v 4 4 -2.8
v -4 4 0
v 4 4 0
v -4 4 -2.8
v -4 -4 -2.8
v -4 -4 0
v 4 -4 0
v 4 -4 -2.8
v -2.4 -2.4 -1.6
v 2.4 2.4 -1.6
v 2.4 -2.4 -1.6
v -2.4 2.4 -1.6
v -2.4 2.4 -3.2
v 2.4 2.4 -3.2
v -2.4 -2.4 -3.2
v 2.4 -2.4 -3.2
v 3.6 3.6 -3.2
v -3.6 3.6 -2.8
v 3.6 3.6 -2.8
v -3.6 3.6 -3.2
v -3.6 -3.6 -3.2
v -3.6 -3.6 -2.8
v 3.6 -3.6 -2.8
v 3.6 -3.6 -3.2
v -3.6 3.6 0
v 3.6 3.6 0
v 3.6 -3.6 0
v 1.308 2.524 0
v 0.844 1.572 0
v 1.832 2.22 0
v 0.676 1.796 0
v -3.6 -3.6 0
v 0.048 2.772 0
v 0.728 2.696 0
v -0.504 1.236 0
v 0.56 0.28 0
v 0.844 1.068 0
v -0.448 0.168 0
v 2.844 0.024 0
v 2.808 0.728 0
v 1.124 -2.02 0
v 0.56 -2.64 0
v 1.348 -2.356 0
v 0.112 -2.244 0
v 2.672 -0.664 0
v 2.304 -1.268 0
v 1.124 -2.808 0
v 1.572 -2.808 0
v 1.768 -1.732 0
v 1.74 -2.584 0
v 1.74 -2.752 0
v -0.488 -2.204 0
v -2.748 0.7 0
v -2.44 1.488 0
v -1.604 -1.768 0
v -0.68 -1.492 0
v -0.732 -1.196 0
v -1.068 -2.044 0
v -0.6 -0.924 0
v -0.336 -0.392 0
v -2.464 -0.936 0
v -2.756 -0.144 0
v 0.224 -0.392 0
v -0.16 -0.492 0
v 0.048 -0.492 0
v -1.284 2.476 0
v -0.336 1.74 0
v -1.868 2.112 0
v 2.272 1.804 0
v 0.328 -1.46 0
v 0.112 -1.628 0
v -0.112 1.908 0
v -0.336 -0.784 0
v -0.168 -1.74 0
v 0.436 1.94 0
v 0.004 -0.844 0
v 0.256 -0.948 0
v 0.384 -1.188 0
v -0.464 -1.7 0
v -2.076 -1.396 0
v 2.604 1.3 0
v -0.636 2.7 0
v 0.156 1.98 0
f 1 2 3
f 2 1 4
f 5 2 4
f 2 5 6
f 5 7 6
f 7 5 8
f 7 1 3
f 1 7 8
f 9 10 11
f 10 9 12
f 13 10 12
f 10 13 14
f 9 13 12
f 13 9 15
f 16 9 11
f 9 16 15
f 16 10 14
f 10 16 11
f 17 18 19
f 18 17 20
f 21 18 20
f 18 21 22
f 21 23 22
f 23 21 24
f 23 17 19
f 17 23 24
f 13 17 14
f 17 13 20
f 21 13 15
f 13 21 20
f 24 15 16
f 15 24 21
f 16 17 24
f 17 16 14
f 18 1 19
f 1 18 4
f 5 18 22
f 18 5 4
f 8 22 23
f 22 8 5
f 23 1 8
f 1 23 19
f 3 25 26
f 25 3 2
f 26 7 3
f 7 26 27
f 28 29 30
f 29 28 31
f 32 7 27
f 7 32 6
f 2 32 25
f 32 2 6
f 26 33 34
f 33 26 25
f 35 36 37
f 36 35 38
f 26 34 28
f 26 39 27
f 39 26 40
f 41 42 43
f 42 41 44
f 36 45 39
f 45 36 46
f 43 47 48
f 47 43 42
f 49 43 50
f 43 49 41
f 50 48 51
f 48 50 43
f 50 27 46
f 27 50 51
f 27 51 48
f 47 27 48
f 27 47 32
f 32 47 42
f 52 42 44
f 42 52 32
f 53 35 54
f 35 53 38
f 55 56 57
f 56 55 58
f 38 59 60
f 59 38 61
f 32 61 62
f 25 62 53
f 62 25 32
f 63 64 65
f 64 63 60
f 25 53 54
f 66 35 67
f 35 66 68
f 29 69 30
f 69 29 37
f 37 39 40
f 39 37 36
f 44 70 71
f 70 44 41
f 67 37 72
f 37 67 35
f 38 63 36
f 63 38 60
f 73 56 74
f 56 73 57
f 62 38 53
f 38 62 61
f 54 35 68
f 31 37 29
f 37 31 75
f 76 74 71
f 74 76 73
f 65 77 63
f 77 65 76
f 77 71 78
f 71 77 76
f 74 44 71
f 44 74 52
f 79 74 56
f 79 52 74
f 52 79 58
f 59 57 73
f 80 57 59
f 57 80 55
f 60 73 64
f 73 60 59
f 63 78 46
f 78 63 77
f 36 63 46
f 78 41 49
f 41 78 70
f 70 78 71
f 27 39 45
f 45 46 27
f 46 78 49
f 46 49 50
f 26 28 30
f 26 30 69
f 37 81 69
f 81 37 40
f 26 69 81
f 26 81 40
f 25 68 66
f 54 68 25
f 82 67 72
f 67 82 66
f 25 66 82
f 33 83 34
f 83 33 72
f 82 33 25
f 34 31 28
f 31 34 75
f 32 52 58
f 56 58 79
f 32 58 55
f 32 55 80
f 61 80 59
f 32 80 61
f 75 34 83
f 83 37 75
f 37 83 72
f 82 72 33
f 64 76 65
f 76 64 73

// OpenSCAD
// file: ../p/box5.scad
use <../lib.scad>
function ldraw_lib__box5() = [
// 0 Box with 5 Faces and All Edges
// 0 Name: box5.dat
// 0 Author: James Jessiman
// 0 !LDRAW_ORG Primitive UPDATE 2012-01
// 0 !LICENSE Licensed under CC BY 2.0 and CC BY 4.0 : see CAreadme.txt
// 
// 0 BFC CERTIFY CCW
  [0,"BFC","CERTIFY"],
  [0,"BFC","CCW"],
// 
// 0 !HISTORY 2002-04-03 [sbliss] Modified for BFC compliance
// 0 !HISTORY 2002-04-25 [PTadmin] Official Update 2002-02
// 0 !HISTORY 2007-06-24 [PTadmin] Header formatted for Contributor Agreement
// 0 !HISTORY 2008-07-01 [PTadmin] Official Update 2008-01
// 0 !HISTORY 2012-02-16 [Philo] Changed to CCW
// 0 !HISTORY 2012-03-30 [PTadmin] Official Update 2012-01
// 
// 
// 2 24 1 1 1 -1 1 1
  [2,24,1,1,1,-1,1,1],
// 2 24 -1 1 1 -1 1 -1
  [2,24,-1,1,1,-1,1,-1],
// 2 24 -1 1 -1 1 1 -1
  [2,24,-1,1,-1,1,1,-1],
// 2 24 1 1 -1 1 1 1
  [2,24,1,1,-1,1,1,1],
// 2 24 1 0 1 -1 0 1
  [2,24,1,0,1,-1,0,1],
// 2 24 -1 0 1 -1 0 -1
  [2,24,-1,0,1,-1,0,-1],
// 2 24 -1 0 -1 1 0 -1
  [2,24,-1,0,-1,1,0,-1],
// 2 24 1 0 -1 1 0 1
  [2,24,1,0,-1,1,0,1],
// 2 24 1 0 1 1 1 1
  [2,24,1,0,1,1,1,1],
// 2 24 -1 0 1 -1 1 1
  [2,24,-1,0,1,-1,1,1],
// 2 24 1 0 -1 1 1 -1
  [2,24,1,0,-1,1,1,-1],
// 2 24 -1 0 -1 -1 1 -1
  [2,24,-1,0,-1,-1,1,-1],
// 4 16 -1 1 1 1 1 1 1 1 -1 -1 1 -1
  [4,16,-1,1,1,1,1,1,1,1,-1,-1,1,-1],
// 4 16 -1 1 1 -1 0 1 1 0 1 1 1 1
  [4,16,-1,1,1,-1,0,1,1,0,1,1,1,1],
// 4 16 -1 1 -1 -1 0 -1 -1 0 1 -1 1 1
  [4,16,-1,1,-1,-1,0,-1,-1,0,1,-1,1,1],
// 4 16 1 1 -1 1 0 -1 -1 0 -1 -1 1 -1
  [4,16,1,1,-1,1,0,-1,-1,0,-1,-1,1,-1],
// 4 16 1 1 1 1 0 1 1 0 -1 1 1 -1
  [4,16,1,1,1,1,0,1,1,0,-1,1,1,-1],
];
makepoly(ldraw_lib__box5(), line=0.2);
// file: ../p/box4.scad
use <../lib.scad>
function ldraw_lib__box4() = [
// 0 Box with 4 Faces (2 Parallel Pairs) and All Edges
// 0 Name: box4.dat
// 0 Author: James Jessiman
// 0 !LDRAW_ORG Primitive UPDATE 2012-01
// 0 !LICENSE Licensed under CC BY 2.0 and CC BY 4.0 : see CAreadme.txt
// 
// 0 BFC CERTIFY CCW
  [0,"BFC","CERTIFY"],
  [0,"BFC","CCW"],
// 
// 0 !HISTORY 2002-04-03 [sbliss] Modified for BFC compliance
// 0 !HISTORY 2002-04-25 [PTadmin] Official Update 2002-02
// 0 !HISTORY 2007-06-24 [PTadmin] Header formatted for Contributor Agreement
// 0 !HISTORY 2008-07-01 [PTadmin] Official Update 2008-01
// 0 !HISTORY 2012-02-16 [Philo] Changed to CCW
// 0 !HISTORY 2012-03-30 [PTadmin] Official Update 2012-01
// 
// 
// 2 24 1 1 1 -1 1 1
  [2,24,1,1,1,-1,1,1],
// 2 24 -1 1 1 -1 1 -1
  [2,24,-1,1,1,-1,1,-1],
// 2 24 -1 1 -1 1 1 -1
  [2,24,-1,1,-1,1,1,-1],
// 2 24 1 1 -1 1 1 1
  [2,24,1,1,-1,1,1,1],
// 2 24 1 0 1 -1 0 1
  [2,24,1,0,1,-1,0,1],
// 2 24 -1 0 1 -1 0 -1
  [2,24,-1,0,1,-1,0,-1],
// 2 24 -1 0 -1 1 0 -1
  [2,24,-1,0,-1,1,0,-1],
// 2 24 1 0 -1 1 0 1
  [2,24,1,0,-1,1,0,1],
// 2 24 1 0 1 1 1 1
  [2,24,1,0,1,1,1,1],
// 2 24 -1 0 1 -1 1 1
  [2,24,-1,0,1,-1,1,1],
// 2 24 1 0 -1 1 1 -1
  [2,24,1,0,-1,1,1,-1],
// 2 24 -1 0 -1 -1 1 -1
  [2,24,-1,0,-1,-1,1,-1],
// 4 16 -1 1 1 -1 0 1 1 0 1 1 1 1
  [4,16,-1,1,1,-1,0,1,1,0,1,1,1,1],
// 4 16 -1 1 -1 -1 0 -1 -1 0 1 -1 1 1
  [4,16,-1,1,-1,-1,0,-1,-1,0,1,-1,1,1],
// 4 16 1 1 -1 1 0 -1 -1 0 -1 -1 1 -1
  [4,16,1,1,-1,1,0,-1,-1,0,-1,-1,1,-1],
// 4 16 1 1 1 1 0 1 1 0 -1 1 1 -1
  [4,16,1,1,1,1,0,1,1,0,-1,1,1,-1],
];
makepoly(ldraw_lib__box4(), line=0.2);
// file: s/3070bs01.scad
use <../../lib.scad>
use <../../p/box4.scad>
use <../../p/box5.scad>
function ldraw_lib__s__3070bs01() = [
// 0 ~Tile  1 x  1 with Groove without Top Face
// 0 Name: s\3070bs01.dat
// 0 Author: Chris Dee [cwdee]
// 0 !LDRAW_ORG Subpart UPDATE 2009-02
// 0 !LICENSE Licensed under CC BY 2.0 and CC BY 4.0 : see CAreadme.txt
// 
// 0 BFC CERTIFY CCW
  [0,"BFC","CERTIFY"],
  [0,"BFC","CCW"],
// 
// 0 !HISTORY 2009-09-03 [PTadmin] Official Update 2009-02
// 
// 
// 1 16 0 0 0 10 0 0 0 7 0 0 0 10 box4.dat
  [1,16,0,0,0,10,0,0,0,7,0,0,0,10, ldraw_lib__box4()],
// 0 BFC INVERTNEXT
  [0,"BFC","INVERTNEXT"],
// 1 16 0 8 0 6 0 0 0 -4 0 0 0 6 box5.dat
  [1,16,0,8,0,6,0,0,0,-4,0,0,0,6, ldraw_lib__box5()],
// 1 16 0 7 0 9 0 0 0 1 0 0 0 9 box4.dat
  [1,16,0,7,0,9,0,0,0,1,0,0,0,9, ldraw_lib__box4()],
// 
// 4 16 9 8 9 6 8 6 -6 8 6 -9 8 9
  [4,16,9,8,9,6,8,6,-6,8,6,-9,8,9],
// 4 16 -9 8 9 -6 8 6 -6 8 -6 -9 8 -9
  [4,16,-9,8,9,-6,8,6,-6,8,-6,-9,8,-9],
// 4 16 -9 8 -9 -6 8 -6 6 8 -6 9 8 -9
  [4,16,-9,8,-9,-6,8,-6,6,8,-6,9,8,-9],
// 4 16 9 8 -9 6 8 -6 6 8 6 9 8 9
  [4,16,9,8,-9,6,8,-6,6,8,6,9,8,9],
// 
// 4 16 10 7 10 9 7 9 -9 7 9 -10 7 10
  [4,16,10,7,10,9,7,9,-9,7,9,-10,7,10],
// 4 16 -10 7 10 -9 7 9 -9 7 -9 -10 7 -10
  [4,16,-10,7,10,-9,7,9,-9,7,-9,-10,7,-10],
// 4 16 -10 7 -10 -9 7 -9 9 7 -9 10 7 -10
  [4,16,-10,7,-10,-9,7,-9,9,7,-9,10,7,-10],
// 4 16 10 7 -10 9 7 -9 9 7 9 10 7 10
  [4,16,10,7,-10,9,7,-9,9,7,9,10,7,10],
// 0
];
makepoly(ldraw_lib__s__3070bs01(), line=0.2);
// main file
use <../lib.scad>
use <s/3070bs01.scad>
function ldraw_lib__3070bp0x() = [
// 0 Tile  1 x  1 with Coral Exclamation Mark in Speech Bubble on Dark Turquoise Background Pattern
// 0 Name: 3070bp0x.dat
// 0 Author: Philippe Hurbain [Philo]
// 0 !LDRAW_ORG Part UPDATE 2020-03
// 0 !LICENSE Licensed under CC BY 2.0 and CC BY 4.0 : see CAreadme.txt
// 
// 0 BFC CERTIFY CCW
  [0,"BFC","CERTIFY"],
  [0,"BFC","CCW"],
// 
// 0 !KEYWORDS Bricklink 3070bpb155, Dots, Set 41916
// 
// 0 !HISTORY 2020-12-29 [PTadmin] Official Update 2020-03
// 
// 
// 1 16 0 0 0 1 0 0 0 1 0 0 0 1 s\3070bs01.dat
  [1,16,0,0,0,1,0,0,0,1,0,0,0,1, ldraw_lib__s__3070bs01()],
// 4 16 10 0 10 -10 0 10 -9 0 9 9 0 9
  [4,16,10,0,10,-10,0,10,-9,0,9,9,0,9],
// 4 16 10 0 -10 10 0 10 9 0 9 9 0 -9
  [4,16,10,0,-10,10,0,10,9,0,9,9,0,-9],
// 4 16 3.27 0 6.31 1.69 0 4.49 2.11 0 3.93 4.58 0 5.55
  [4,16,3.27,0,6.31,1.69,0,4.49,2.11,0,3.93,4.58,0,5.55],
// 4 16 -9 0 -9 -10 0 -10 10 0 -10 9 0 -9
  [4,16,-9,0,-9,-10,0,-10,10,0,-10,9,0,-9],
// 4 16 -9 0 9 -10 0 10 -10 0 -10 -9 0 -9
  [4,16,-9,0,9,-10,0,10,-10,0,-10,-9,0,-9],
// 4 3 0.12 0 6.93 1.82 0 6.74 9 0 9 -9 0 9
  [4,3,0.12,0,6.93,1.82,0,6.74,9,0,9,-9,0,9],
// 4 29 1.4 0 0.7 2.11 0 2.67 -1.26 0 3.09 -1.12 0 0.42
  [4,29,1.4,0,0.7,2.11,0,2.67,-1.26,0,3.09,-1.12,0,0.42],
// 3 3 9 0 9 1.82 0 6.74 3.27 0 6.31
  [3,3,9,0,9,1.82,0,6.74,3.27,0,6.31],
// 4 3 9 0 9 7.02 0 1.82 7.11 0 0.06 9 0 -9
  [4,3,9,0,9,7.02,0,1.82,7.11,0,0.06,9,0,-9],
// 4 16 2.81 0 -5.05 0.28 0 -5.61 1.4 0 -6.6 3.37 0 -5.89
  [4,16,2.81,0,-5.05,0.28,0,-5.61,1.4,0,-6.6,3.37,0,-5.89],
// 4 16 1.4 0 0.7 5.76 0 -3.17 6.68 0 -1.66 7.11 0 0.06
  [4,16,1.4,0,0.7,5.76,0,-3.17,6.68,0,-1.66,7.11,0,0.06],
// 4 16 3.37 0 -5.89 1.4 0 -6.6 2.81 0 -7.02 3.93 0 -7.02
  [4,16,3.37,0,-5.89,1.4,0,-6.6,2.81,0,-7.02,3.93,0,-7.02],
// 4 3 4.42 0 -4.33 2.81 0 -5.05 3.37 0 -5.89 4.35 0 -6.46
  [4,3,4.42,0,-4.33,2.81,0,-5.05,3.37,0,-5.89,4.35,0,-6.46],
// 4 16 4.35 0 -6.88 4.35 0 -6.46 3.37 0 -5.89 3.93 0 -7.02
  [4,16,4.35,0,-6.88,4.35,0,-6.46,3.37,0,-5.89,3.93,0,-7.02],
// 4 3 4.35 0 -6.46 4.35 0 -6.88 9 0 -9 5.76 0 -3.17
  [4,3,4.35,0,-6.46,4.35,0,-6.88,9,0,-9,5.76,0,-3.17],
// 3 3 9 0 -9 4.35 0 -6.88 3.93 0 -7.02
  [3,3,9,0,-9,4.35,0,-6.88,3.93,0,-7.02],
// 4 3 9 0 -9 3.93 0 -7.02 2.81 0 -7.02 -9 0 -9
  [4,3,9,0,-9,3.93,0,-7.02,2.81,0,-7.02,-9,0,-9],
// 3 3 -9 0 -9 2.81 0 -7.02 1.4 0 -6.6
  [3,3,-9,0,-9,2.81,0,-7.02,1.4,0,-6.6],
// 4 3 -1.22 0 -5.51 -9 0 -9 1.4 0 -6.6 0.28 0 -5.61
  [4,3,-1.22,0,-5.51,-9,0,-9,1.4,0,-6.6,0.28,0,-5.61],
// 4 16 -1.26 0 3.09 -6.1 0 3.72 -6.87 0 1.75 -1.12 0 0.42
  [4,16,-1.26,0,3.09,-6.1,0,3.72,-6.87,0,1.75,-1.12,0,0.42],
// 4 16 -4.01 0 -4.42 -2.67 0 -5.11 -1.7 0 -3.73 -1.83 0 -2.99
  [4,16,-4.01,0,-4.42,-2.67,0,-5.11,-1.7,0,-3.73,-1.83,0,-2.99],
// 4 16 -1.5 0 -2.31 -0.84 0 -0.98 -1.12 0 0.42 -6.16 0 -2.34
  [4,16,-1.5,0,-2.31,-0.84,0,-0.98,-1.12,0,0.42,-6.16,0,-2.34],
// 3 3 -9 0 -9 -6.16 0 -2.34 -6.89 0 -0.36
  [3,3,-9,0,-9,-6.16,0,-2.34,-6.89,0,-0.36],
// 4 3 -6.89 0 -0.36 -6.87 0 1.75 -9 0 9 -9 0 -9
  [4,3,-6.89,0,-0.36,-6.87,0,1.75,-9,0,9,-9,0,-9],
// 4 29 -0.4 0 -1.23 0.12 0 -1.23 0.56 0 -0.98 -0.84 0 -0.98
  [4,29,-0.4,0,-1.23,0.12,0,-1.23,0.56,0,-0.98,-0.84,0,-0.98],
// 3 3 -9 0 9 -6.87 0 1.75 -6.1 0 3.72
  [3,3,-9,0,9,-6.87,0,1.75,-6.1,0,3.72],
// 4 16 -1.26 0 3.09 -0.84 0 4.35 -3.21 0 6.19 -4.67 0 5.28
  [4,16,-1.26,0,3.09,-0.84,0,4.35,-3.21,0,6.19,-4.67,0,5.28],
// 4 16 5.68 0 4.51 4.58 0 5.55 2.11 0 3.93 2.11 0 2.67
  [4,16,5.68,0,4.51,4.58,0,5.55,2.11,0,3.93,2.11,0,2.67],
// 4 16 2.11 0 2.67 1.4 0 0.7 7.11 0 0.06 7.02 0 1.82
  [4,16,2.11,0,2.67,1.4,0,0.7,7.11,0,0.06,7.02,0,1.82],
// 4 16 0.82 0 -3.65 0.28 0 -4.07 0.28 0 -5.61 2.81 0 -5.05
  [4,16,0.82,0,-3.65,0.28,0,-4.07,0.28,0,-5.61,2.81,0,-5.05],
// 4 29 -0.28 0 4.77 -0.84 0 4.35 -1.26 0 3.09 2.11 0 2.67
  [4,29,-0.28,0,4.77,-0.84,0,4.35,-1.26,0,3.09,2.11,0,2.67],
// 4 29 -1.12 0 0.42 -0.84 0 -0.98 0.56 0 -0.98 1.4 0 0.7
  [4,29,-1.12,0,0.42,-0.84,0,-0.98,0.56,0,-0.98,1.4,0,0.7],
// 4 29 -0.84 0 -1.96 -1.83 0 -2.99 -1.7 0 -3.73 -0.42 0 -4.35
  [4,29,-0.84,0,-1.96,-1.83,0,-2.99,-1.7,0,-3.73,-0.42,0,-4.35],
// 4 16 -1.12 0 0.42 -6.87 0 1.75 -6.89 0 -0.36 -6.16 0 -2.34
  [4,16,-1.12,0,0.42,-6.87,0,1.75,-6.89,0,-0.36,-6.16,0,-2.34],
// 3 16 -6.1 0 3.72 -1.26 0 3.09 -4.67 0 5.28
  [3,16,-6.1,0,3.72,-1.26,0,3.09,-4.67,0,5.28],
// 4 29 1.69 0 4.49 1.09 0 4.85 2.11 0 2.67 2.11 0 3.93
  [4,29,1.69,0,4.49,1.09,0,4.85,2.11,0,2.67,2.11,0,3.93],
// 4 29 -0.42 0 -4.35 0.28 0 -4.07 0.01 0 -2.11 -0.84 0 -1.96
  [4,29,-0.42,0,-4.35,0.28,0,-4.07,0.01,0,-2.11,-0.84,0,-1.96],
// 4 16 0.12 0 -1.23 0.01 0 -2.11 0.64 0 -2.37 0.56 0 -0.98
  [4,16,0.12,0,-1.23,0.01,0,-2.11,0.64,0,-2.37,0.56,0,-0.98],
// 4 29 0.96 0 -2.97 0.64 0 -2.37 0.01 0 -2.11 0.28 0 -4.07
  [4,29,0.96,0,-2.97,0.64,0,-2.37,0.01,0,-2.11,0.28,0,-4.07],
// 4 16 0.28 0 -5.61 0.28 0 -4.07 -0.42 0 -4.35 -1.22 0 -5.51
  [4,16,0.28,0,-5.61,0.28,0,-4.07,-0.42,0,-4.35,-1.22,0,-5.51],
// 3 29 -1.16 0 -4.25 -0.42 0 -4.35 -1.7 0 -3.73
  [3,29,-1.16,0,-4.25,-0.42,0,-4.35,-1.7,0,-3.73],
// 4 16 -1.16 0 -4.25 -2.67 0 -5.11 -1.22 0 -5.51 -0.42 0 -4.35
  [4,16,-1.16,0,-4.25,-2.67,0,-5.11,-1.22,0,-5.51,-0.42,0,-4.35],
// 3 29 -1.5 0 -2.31 -1.83 0 -2.99 -0.84 0 -1.96
  [3,29,-1.5,0,-2.31,-1.83,0,-2.99,-0.84,0,-1.96],
// 4 16 -1.83 0 -2.99 -1.5 0 -2.31 -5.19 0 -3.49 -4.01 0 -4.42
  [4,16,-1.83,0,-2.99,-1.5,0,-2.31,-5.19,0,-3.49,-4.01,0,-4.42],
// 4 16 -0.84 0 -0.98 -1.5 0 -2.31 -0.84 0 -1.96 -0.4 0 -1.23
  [4,16,-0.84,0,-0.98,-1.5,0,-2.31,-0.84,0,-1.96,-0.4,0,-1.23],
// 4 16 0.56 0 -0.98 0.64 0 -2.37 0.96 0 -2.97 5.76 0 -3.17
  [4,16,0.56,0,-0.98,0.64,0,-2.37,0.96,0,-2.97,5.76,0,-3.17],
// 3 16 1.4 0 0.7 0.56 0 -0.98 5.76 0 -3.17
  [3,16,1.4,0,0.7,0.56,0,-0.98,5.76,0,-3.17],
// 4 16 0.96 0 -2.97 0.82 0 -3.65 2.81 0 -5.05 4.42 0 -4.33
  [4,16,0.96,0,-2.97,0.82,0,-3.65,2.81,0,-5.05,4.42,0,-4.33],
// 3 29 0.82 0 -3.65 0.96 0 -2.97 0.28 0 -4.07
  [3,29,0.82,0,-3.65,0.96,0,-2.97,0.28,0,-4.07],
// 3 3 9 0 -9 7.11 0 0.06 6.68 0 -1.66
  [3,3,9,0,-9,7.11,0,0.06,6.68,0,-1.66],
// 3 3 6.68 0 -1.66 5.76 0 -3.17 9 0 -9
  [3,3,6.68,0,-1.66,5.76,0,-3.17,9,0,-9],
// 3 16 5.76 0 -3.17 0.96 0 -2.97 4.42 0 -4.33
  [3,16,5.76,0,-3.17,0.96,0,-2.97,4.42,0,-4.33],
// 3 3 5.76 0 -3.17 4.42 0 -4.33 4.35 0 -6.46
  [3,3,5.76,0,-3.17,4.42,0,-4.33,4.35,0,-6.46],
// 3 3 9 0 9 3.27 0 6.31 4.58 0 5.55
  [3,3,9,0,9,3.27,0,6.31,4.58,0,5.55],
// 3 3 9 0 9 4.58 0 5.55 5.68 0 4.51
  [3,3,9,0,9,4.58,0,5.55,5.68,0,4.51],
// 4 16 6.51 0 3.25 5.68 0 4.51 2.11 0 2.67 7.02 0 1.82
  [4,16,6.51,0,3.25,5.68,0,4.51,2.11,0,2.67,7.02,0,1.82],
// 3 3 9 0 9 5.68 0 4.51 6.51 0 3.25
  [3,3,9,0,9,5.68,0,4.51,6.51,0,3.25],
// 3 3 9 0 9 6.51 0 3.25 7.02 0 1.82
  [3,3,9,0,9,6.51,0,3.25,7.02,0,1.82],
// 3 3 -9 0 9 -4.67 0 5.28 -3.21 0 6.19
  [3,3,-9,0,9,-4.67,0,5.28,-3.21,0,6.19],
// 3 3 -6.1 0 3.72 -4.67 0 5.28 -9 0 9
  [3,3,-6.1,0,3.72,-4.67,0,5.28,-9,0,9],
// 4 16 -1.59 0 6.75 -3.21 0 6.19 -0.84 0 4.35 -0.28 0 4.77
  [4,16,-1.59,0,6.75,-3.21,0,6.19,-0.84,0,4.35,-0.28,0,4.77],
// 3 3 -9 0 9 -3.21 0 6.19 -1.59 0 6.75
  [3,3,-9,0,9,-3.21,0,6.19,-1.59,0,6.75],
// 4 16 0.12 0 6.93 -0.28 0 4.77 0.39 0 4.95 1.82 0 6.74
  [4,16,0.12,0,6.93,-0.28,0,4.77,0.39,0,4.95,1.82,0,6.74],
// 3 3 -1.59 0 6.75 0.12 0 6.93 -9 0 9
  [3,3,-1.59,0,6.75,0.12,0,6.93,-9,0,9],
// 4 16 1.82 0 6.74 1.09 0 4.85 1.69 0 4.49 3.27 0 6.31
  [4,16,1.82,0,6.74,1.09,0,4.85,1.69,0,4.49,3.27,0,6.31],
// 3 3 -9 0 -9 -1.22 0 -5.51 -2.67 0 -5.11
  [3,3,-9,0,-9,-1.22,0,-5.51,-2.67,0,-5.11],
// 3 16 -1.7 0 -3.73 -2.67 0 -5.11 -1.16 0 -4.25
  [3,16,-1.7,0,-3.73,-2.67,0,-5.11,-1.16,0,-4.25],
// 3 3 -9 0 -9 -2.67 0 -5.11 -4.01 0 -4.42
  [3,3,-9,0,-9,-2.67,0,-5.11,-4.01,0,-4.42],
// 3 3 -9 0 -9 -4.01 0 -4.42 -5.19 0 -3.49
  [3,3,-9,0,-9,-4.01,0,-4.42,-5.19,0,-3.49],
// 3 16 -6.16 0 -2.34 -5.19 0 -3.49 -1.5 0 -2.31
  [3,16,-6.16,0,-2.34,-5.19,0,-3.49,-1.5,0,-2.31],
// 3 3 -9 0 -9 -5.19 0 -3.49 -6.16 0 -2.34
  [3,3,-9,0,-9,-5.19,0,-3.49,-6.16,0,-2.34],
// 3 16 1.09 0 4.85 1.82 0 6.74 0.39 0 4.95
  [3,16,1.09,0,4.85,1.82,0,6.74,0.39,0,4.95],
// 4 29 2.11 0 2.67 1.09 0 4.85 0.39 0 4.95 -0.28 0 4.77
  [4,29,2.11,0,2.67,1.09,0,4.85,0.39,0,4.95,-0.28,0,4.77],
// 3 16 -1.59 0 6.75 -0.28 0 4.77 0.12 0 6.93
  [3,16,-1.59,0,6.75,-0.28,0,4.77,0.12,0,6.93],
// 4 16 -0.4 0 -1.23 -0.84 0 -1.96 0.01 0 -2.11 0.12 0 -1.23
  [4,16,-0.4,0,-1.23,-0.84,0,-1.96,0.01,0,-2.11,0.12,0,-1.23],
];
makepoly(ldraw_lib__3070bp0x(), line=0.2);
